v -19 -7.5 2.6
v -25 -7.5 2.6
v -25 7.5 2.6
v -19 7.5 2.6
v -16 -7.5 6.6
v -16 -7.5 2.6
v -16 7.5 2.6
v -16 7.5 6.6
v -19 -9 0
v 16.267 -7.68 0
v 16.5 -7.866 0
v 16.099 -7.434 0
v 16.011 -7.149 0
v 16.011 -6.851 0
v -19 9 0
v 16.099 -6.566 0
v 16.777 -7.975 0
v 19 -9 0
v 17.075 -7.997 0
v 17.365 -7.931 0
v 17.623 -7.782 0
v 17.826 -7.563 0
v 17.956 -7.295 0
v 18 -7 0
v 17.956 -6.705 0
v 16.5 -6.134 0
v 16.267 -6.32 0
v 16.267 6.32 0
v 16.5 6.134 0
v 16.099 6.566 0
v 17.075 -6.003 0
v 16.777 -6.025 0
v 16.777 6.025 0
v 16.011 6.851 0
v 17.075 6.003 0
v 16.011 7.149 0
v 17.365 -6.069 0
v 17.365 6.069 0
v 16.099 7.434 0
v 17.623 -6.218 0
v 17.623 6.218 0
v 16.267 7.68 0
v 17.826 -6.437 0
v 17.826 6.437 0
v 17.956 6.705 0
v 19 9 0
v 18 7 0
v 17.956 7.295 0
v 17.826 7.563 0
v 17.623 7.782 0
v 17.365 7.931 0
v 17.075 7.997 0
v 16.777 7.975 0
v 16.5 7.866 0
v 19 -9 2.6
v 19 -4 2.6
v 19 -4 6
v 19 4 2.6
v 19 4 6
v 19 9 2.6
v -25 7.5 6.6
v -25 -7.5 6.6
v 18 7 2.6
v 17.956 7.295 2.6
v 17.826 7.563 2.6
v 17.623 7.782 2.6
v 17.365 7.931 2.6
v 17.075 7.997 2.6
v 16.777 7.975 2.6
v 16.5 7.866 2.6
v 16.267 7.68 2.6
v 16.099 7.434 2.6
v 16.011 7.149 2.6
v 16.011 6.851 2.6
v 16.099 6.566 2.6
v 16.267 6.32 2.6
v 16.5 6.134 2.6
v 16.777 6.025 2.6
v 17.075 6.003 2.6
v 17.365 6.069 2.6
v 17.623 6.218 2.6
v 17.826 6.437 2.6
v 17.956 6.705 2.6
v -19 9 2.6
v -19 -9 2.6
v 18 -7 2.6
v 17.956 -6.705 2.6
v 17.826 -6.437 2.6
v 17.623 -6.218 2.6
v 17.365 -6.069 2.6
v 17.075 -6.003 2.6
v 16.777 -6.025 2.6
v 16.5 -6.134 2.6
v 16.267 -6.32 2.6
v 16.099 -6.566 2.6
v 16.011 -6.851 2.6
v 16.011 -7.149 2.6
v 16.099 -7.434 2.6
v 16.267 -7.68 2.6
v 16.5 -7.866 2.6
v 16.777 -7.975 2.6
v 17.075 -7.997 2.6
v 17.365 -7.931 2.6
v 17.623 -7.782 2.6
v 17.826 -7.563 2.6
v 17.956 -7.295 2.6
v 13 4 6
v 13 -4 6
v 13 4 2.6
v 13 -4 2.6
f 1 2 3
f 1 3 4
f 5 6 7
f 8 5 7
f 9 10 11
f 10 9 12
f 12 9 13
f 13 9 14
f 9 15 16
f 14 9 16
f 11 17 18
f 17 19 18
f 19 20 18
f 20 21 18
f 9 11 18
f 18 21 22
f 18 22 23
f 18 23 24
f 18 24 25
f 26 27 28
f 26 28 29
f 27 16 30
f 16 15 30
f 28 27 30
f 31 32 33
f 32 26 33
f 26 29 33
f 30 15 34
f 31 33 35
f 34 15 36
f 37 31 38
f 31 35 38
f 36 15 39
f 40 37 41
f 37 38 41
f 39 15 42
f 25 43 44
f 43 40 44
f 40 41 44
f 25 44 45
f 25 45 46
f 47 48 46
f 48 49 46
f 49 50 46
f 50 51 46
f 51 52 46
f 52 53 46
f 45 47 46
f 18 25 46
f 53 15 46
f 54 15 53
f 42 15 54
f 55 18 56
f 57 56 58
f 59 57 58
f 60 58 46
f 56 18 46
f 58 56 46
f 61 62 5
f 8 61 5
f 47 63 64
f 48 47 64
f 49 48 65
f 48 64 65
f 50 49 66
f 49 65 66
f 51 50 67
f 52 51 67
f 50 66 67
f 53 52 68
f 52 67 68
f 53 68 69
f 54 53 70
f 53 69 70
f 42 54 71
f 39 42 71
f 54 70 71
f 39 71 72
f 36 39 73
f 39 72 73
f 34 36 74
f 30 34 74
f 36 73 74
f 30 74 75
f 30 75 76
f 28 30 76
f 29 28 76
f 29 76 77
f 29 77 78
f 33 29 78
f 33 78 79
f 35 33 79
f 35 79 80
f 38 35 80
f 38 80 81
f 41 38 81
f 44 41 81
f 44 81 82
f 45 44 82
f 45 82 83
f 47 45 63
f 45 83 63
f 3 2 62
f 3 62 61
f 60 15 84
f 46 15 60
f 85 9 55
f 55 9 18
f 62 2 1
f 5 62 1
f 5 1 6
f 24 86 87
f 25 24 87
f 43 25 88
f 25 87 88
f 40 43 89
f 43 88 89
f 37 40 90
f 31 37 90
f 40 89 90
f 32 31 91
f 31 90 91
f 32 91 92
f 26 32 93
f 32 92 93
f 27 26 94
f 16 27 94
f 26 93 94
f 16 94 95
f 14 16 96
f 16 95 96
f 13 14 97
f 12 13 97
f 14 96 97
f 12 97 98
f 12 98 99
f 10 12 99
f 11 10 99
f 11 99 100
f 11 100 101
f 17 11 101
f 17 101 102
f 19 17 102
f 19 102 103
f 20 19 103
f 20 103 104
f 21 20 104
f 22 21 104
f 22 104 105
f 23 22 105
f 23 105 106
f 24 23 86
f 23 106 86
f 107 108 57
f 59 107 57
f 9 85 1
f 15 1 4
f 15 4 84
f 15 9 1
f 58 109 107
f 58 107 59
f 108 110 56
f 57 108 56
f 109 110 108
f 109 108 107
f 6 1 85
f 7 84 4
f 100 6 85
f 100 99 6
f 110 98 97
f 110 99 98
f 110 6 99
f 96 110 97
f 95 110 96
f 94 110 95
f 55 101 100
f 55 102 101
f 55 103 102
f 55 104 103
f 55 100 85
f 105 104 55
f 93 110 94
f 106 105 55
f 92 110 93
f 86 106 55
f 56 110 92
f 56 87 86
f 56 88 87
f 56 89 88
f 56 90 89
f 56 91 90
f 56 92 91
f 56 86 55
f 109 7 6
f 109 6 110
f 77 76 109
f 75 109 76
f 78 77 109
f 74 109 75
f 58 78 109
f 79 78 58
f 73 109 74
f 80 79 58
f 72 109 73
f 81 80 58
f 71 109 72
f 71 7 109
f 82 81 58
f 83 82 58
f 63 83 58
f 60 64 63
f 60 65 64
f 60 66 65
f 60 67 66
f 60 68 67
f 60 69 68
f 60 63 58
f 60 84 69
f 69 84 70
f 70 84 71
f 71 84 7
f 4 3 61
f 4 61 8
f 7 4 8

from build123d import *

# Parameters (mm, degrees)
F0_W     = 38
F0_H     = 18
F1_DEPTH = 2.6
F2_R     = 1
F3_DEPTH = 2.6
F4_W     = 6
F4_H     = 8
F5_DEPTH = 3.4
F6_W     = 9
F6_H     = 15
F7_DEPTH = 4


with BuildPart() as f1:
    # F0 (on Top) → F1 (new body)
    with BuildSketch(Plane.XY):
        Rectangle(F0_W, F0_H)
    extrude(amount=F1_DEPTH)

    # F2 (on face) → F3 (cut, through all)
    with BuildSketch(Plane.XY.offset(2.6)):
        with Locations((17, 7)):
            Circle(F2_R)
        with Locations((17, -7)):
            Circle(F2_R)
    extrude(amount=-F3_DEPTH, mode=Mode.SUBTRACT)

    # F4 (on face) → F5 (join)
    with BuildSketch(Plane.XY.offset(2.6)):
        with Locations((16, 0)):
            Rectangle(F4_W, F4_H)
    extrude(amount=F5_DEPTH)

    # F6 (on face) → F7 (join)
    with BuildSketch(Plane.XY.offset(2.6)):
        with Locations((-20.5, 0)):
            Rectangle(F6_W, F6_H)
    extrude(amount=F7_DEPTH)


solid = f1.part
